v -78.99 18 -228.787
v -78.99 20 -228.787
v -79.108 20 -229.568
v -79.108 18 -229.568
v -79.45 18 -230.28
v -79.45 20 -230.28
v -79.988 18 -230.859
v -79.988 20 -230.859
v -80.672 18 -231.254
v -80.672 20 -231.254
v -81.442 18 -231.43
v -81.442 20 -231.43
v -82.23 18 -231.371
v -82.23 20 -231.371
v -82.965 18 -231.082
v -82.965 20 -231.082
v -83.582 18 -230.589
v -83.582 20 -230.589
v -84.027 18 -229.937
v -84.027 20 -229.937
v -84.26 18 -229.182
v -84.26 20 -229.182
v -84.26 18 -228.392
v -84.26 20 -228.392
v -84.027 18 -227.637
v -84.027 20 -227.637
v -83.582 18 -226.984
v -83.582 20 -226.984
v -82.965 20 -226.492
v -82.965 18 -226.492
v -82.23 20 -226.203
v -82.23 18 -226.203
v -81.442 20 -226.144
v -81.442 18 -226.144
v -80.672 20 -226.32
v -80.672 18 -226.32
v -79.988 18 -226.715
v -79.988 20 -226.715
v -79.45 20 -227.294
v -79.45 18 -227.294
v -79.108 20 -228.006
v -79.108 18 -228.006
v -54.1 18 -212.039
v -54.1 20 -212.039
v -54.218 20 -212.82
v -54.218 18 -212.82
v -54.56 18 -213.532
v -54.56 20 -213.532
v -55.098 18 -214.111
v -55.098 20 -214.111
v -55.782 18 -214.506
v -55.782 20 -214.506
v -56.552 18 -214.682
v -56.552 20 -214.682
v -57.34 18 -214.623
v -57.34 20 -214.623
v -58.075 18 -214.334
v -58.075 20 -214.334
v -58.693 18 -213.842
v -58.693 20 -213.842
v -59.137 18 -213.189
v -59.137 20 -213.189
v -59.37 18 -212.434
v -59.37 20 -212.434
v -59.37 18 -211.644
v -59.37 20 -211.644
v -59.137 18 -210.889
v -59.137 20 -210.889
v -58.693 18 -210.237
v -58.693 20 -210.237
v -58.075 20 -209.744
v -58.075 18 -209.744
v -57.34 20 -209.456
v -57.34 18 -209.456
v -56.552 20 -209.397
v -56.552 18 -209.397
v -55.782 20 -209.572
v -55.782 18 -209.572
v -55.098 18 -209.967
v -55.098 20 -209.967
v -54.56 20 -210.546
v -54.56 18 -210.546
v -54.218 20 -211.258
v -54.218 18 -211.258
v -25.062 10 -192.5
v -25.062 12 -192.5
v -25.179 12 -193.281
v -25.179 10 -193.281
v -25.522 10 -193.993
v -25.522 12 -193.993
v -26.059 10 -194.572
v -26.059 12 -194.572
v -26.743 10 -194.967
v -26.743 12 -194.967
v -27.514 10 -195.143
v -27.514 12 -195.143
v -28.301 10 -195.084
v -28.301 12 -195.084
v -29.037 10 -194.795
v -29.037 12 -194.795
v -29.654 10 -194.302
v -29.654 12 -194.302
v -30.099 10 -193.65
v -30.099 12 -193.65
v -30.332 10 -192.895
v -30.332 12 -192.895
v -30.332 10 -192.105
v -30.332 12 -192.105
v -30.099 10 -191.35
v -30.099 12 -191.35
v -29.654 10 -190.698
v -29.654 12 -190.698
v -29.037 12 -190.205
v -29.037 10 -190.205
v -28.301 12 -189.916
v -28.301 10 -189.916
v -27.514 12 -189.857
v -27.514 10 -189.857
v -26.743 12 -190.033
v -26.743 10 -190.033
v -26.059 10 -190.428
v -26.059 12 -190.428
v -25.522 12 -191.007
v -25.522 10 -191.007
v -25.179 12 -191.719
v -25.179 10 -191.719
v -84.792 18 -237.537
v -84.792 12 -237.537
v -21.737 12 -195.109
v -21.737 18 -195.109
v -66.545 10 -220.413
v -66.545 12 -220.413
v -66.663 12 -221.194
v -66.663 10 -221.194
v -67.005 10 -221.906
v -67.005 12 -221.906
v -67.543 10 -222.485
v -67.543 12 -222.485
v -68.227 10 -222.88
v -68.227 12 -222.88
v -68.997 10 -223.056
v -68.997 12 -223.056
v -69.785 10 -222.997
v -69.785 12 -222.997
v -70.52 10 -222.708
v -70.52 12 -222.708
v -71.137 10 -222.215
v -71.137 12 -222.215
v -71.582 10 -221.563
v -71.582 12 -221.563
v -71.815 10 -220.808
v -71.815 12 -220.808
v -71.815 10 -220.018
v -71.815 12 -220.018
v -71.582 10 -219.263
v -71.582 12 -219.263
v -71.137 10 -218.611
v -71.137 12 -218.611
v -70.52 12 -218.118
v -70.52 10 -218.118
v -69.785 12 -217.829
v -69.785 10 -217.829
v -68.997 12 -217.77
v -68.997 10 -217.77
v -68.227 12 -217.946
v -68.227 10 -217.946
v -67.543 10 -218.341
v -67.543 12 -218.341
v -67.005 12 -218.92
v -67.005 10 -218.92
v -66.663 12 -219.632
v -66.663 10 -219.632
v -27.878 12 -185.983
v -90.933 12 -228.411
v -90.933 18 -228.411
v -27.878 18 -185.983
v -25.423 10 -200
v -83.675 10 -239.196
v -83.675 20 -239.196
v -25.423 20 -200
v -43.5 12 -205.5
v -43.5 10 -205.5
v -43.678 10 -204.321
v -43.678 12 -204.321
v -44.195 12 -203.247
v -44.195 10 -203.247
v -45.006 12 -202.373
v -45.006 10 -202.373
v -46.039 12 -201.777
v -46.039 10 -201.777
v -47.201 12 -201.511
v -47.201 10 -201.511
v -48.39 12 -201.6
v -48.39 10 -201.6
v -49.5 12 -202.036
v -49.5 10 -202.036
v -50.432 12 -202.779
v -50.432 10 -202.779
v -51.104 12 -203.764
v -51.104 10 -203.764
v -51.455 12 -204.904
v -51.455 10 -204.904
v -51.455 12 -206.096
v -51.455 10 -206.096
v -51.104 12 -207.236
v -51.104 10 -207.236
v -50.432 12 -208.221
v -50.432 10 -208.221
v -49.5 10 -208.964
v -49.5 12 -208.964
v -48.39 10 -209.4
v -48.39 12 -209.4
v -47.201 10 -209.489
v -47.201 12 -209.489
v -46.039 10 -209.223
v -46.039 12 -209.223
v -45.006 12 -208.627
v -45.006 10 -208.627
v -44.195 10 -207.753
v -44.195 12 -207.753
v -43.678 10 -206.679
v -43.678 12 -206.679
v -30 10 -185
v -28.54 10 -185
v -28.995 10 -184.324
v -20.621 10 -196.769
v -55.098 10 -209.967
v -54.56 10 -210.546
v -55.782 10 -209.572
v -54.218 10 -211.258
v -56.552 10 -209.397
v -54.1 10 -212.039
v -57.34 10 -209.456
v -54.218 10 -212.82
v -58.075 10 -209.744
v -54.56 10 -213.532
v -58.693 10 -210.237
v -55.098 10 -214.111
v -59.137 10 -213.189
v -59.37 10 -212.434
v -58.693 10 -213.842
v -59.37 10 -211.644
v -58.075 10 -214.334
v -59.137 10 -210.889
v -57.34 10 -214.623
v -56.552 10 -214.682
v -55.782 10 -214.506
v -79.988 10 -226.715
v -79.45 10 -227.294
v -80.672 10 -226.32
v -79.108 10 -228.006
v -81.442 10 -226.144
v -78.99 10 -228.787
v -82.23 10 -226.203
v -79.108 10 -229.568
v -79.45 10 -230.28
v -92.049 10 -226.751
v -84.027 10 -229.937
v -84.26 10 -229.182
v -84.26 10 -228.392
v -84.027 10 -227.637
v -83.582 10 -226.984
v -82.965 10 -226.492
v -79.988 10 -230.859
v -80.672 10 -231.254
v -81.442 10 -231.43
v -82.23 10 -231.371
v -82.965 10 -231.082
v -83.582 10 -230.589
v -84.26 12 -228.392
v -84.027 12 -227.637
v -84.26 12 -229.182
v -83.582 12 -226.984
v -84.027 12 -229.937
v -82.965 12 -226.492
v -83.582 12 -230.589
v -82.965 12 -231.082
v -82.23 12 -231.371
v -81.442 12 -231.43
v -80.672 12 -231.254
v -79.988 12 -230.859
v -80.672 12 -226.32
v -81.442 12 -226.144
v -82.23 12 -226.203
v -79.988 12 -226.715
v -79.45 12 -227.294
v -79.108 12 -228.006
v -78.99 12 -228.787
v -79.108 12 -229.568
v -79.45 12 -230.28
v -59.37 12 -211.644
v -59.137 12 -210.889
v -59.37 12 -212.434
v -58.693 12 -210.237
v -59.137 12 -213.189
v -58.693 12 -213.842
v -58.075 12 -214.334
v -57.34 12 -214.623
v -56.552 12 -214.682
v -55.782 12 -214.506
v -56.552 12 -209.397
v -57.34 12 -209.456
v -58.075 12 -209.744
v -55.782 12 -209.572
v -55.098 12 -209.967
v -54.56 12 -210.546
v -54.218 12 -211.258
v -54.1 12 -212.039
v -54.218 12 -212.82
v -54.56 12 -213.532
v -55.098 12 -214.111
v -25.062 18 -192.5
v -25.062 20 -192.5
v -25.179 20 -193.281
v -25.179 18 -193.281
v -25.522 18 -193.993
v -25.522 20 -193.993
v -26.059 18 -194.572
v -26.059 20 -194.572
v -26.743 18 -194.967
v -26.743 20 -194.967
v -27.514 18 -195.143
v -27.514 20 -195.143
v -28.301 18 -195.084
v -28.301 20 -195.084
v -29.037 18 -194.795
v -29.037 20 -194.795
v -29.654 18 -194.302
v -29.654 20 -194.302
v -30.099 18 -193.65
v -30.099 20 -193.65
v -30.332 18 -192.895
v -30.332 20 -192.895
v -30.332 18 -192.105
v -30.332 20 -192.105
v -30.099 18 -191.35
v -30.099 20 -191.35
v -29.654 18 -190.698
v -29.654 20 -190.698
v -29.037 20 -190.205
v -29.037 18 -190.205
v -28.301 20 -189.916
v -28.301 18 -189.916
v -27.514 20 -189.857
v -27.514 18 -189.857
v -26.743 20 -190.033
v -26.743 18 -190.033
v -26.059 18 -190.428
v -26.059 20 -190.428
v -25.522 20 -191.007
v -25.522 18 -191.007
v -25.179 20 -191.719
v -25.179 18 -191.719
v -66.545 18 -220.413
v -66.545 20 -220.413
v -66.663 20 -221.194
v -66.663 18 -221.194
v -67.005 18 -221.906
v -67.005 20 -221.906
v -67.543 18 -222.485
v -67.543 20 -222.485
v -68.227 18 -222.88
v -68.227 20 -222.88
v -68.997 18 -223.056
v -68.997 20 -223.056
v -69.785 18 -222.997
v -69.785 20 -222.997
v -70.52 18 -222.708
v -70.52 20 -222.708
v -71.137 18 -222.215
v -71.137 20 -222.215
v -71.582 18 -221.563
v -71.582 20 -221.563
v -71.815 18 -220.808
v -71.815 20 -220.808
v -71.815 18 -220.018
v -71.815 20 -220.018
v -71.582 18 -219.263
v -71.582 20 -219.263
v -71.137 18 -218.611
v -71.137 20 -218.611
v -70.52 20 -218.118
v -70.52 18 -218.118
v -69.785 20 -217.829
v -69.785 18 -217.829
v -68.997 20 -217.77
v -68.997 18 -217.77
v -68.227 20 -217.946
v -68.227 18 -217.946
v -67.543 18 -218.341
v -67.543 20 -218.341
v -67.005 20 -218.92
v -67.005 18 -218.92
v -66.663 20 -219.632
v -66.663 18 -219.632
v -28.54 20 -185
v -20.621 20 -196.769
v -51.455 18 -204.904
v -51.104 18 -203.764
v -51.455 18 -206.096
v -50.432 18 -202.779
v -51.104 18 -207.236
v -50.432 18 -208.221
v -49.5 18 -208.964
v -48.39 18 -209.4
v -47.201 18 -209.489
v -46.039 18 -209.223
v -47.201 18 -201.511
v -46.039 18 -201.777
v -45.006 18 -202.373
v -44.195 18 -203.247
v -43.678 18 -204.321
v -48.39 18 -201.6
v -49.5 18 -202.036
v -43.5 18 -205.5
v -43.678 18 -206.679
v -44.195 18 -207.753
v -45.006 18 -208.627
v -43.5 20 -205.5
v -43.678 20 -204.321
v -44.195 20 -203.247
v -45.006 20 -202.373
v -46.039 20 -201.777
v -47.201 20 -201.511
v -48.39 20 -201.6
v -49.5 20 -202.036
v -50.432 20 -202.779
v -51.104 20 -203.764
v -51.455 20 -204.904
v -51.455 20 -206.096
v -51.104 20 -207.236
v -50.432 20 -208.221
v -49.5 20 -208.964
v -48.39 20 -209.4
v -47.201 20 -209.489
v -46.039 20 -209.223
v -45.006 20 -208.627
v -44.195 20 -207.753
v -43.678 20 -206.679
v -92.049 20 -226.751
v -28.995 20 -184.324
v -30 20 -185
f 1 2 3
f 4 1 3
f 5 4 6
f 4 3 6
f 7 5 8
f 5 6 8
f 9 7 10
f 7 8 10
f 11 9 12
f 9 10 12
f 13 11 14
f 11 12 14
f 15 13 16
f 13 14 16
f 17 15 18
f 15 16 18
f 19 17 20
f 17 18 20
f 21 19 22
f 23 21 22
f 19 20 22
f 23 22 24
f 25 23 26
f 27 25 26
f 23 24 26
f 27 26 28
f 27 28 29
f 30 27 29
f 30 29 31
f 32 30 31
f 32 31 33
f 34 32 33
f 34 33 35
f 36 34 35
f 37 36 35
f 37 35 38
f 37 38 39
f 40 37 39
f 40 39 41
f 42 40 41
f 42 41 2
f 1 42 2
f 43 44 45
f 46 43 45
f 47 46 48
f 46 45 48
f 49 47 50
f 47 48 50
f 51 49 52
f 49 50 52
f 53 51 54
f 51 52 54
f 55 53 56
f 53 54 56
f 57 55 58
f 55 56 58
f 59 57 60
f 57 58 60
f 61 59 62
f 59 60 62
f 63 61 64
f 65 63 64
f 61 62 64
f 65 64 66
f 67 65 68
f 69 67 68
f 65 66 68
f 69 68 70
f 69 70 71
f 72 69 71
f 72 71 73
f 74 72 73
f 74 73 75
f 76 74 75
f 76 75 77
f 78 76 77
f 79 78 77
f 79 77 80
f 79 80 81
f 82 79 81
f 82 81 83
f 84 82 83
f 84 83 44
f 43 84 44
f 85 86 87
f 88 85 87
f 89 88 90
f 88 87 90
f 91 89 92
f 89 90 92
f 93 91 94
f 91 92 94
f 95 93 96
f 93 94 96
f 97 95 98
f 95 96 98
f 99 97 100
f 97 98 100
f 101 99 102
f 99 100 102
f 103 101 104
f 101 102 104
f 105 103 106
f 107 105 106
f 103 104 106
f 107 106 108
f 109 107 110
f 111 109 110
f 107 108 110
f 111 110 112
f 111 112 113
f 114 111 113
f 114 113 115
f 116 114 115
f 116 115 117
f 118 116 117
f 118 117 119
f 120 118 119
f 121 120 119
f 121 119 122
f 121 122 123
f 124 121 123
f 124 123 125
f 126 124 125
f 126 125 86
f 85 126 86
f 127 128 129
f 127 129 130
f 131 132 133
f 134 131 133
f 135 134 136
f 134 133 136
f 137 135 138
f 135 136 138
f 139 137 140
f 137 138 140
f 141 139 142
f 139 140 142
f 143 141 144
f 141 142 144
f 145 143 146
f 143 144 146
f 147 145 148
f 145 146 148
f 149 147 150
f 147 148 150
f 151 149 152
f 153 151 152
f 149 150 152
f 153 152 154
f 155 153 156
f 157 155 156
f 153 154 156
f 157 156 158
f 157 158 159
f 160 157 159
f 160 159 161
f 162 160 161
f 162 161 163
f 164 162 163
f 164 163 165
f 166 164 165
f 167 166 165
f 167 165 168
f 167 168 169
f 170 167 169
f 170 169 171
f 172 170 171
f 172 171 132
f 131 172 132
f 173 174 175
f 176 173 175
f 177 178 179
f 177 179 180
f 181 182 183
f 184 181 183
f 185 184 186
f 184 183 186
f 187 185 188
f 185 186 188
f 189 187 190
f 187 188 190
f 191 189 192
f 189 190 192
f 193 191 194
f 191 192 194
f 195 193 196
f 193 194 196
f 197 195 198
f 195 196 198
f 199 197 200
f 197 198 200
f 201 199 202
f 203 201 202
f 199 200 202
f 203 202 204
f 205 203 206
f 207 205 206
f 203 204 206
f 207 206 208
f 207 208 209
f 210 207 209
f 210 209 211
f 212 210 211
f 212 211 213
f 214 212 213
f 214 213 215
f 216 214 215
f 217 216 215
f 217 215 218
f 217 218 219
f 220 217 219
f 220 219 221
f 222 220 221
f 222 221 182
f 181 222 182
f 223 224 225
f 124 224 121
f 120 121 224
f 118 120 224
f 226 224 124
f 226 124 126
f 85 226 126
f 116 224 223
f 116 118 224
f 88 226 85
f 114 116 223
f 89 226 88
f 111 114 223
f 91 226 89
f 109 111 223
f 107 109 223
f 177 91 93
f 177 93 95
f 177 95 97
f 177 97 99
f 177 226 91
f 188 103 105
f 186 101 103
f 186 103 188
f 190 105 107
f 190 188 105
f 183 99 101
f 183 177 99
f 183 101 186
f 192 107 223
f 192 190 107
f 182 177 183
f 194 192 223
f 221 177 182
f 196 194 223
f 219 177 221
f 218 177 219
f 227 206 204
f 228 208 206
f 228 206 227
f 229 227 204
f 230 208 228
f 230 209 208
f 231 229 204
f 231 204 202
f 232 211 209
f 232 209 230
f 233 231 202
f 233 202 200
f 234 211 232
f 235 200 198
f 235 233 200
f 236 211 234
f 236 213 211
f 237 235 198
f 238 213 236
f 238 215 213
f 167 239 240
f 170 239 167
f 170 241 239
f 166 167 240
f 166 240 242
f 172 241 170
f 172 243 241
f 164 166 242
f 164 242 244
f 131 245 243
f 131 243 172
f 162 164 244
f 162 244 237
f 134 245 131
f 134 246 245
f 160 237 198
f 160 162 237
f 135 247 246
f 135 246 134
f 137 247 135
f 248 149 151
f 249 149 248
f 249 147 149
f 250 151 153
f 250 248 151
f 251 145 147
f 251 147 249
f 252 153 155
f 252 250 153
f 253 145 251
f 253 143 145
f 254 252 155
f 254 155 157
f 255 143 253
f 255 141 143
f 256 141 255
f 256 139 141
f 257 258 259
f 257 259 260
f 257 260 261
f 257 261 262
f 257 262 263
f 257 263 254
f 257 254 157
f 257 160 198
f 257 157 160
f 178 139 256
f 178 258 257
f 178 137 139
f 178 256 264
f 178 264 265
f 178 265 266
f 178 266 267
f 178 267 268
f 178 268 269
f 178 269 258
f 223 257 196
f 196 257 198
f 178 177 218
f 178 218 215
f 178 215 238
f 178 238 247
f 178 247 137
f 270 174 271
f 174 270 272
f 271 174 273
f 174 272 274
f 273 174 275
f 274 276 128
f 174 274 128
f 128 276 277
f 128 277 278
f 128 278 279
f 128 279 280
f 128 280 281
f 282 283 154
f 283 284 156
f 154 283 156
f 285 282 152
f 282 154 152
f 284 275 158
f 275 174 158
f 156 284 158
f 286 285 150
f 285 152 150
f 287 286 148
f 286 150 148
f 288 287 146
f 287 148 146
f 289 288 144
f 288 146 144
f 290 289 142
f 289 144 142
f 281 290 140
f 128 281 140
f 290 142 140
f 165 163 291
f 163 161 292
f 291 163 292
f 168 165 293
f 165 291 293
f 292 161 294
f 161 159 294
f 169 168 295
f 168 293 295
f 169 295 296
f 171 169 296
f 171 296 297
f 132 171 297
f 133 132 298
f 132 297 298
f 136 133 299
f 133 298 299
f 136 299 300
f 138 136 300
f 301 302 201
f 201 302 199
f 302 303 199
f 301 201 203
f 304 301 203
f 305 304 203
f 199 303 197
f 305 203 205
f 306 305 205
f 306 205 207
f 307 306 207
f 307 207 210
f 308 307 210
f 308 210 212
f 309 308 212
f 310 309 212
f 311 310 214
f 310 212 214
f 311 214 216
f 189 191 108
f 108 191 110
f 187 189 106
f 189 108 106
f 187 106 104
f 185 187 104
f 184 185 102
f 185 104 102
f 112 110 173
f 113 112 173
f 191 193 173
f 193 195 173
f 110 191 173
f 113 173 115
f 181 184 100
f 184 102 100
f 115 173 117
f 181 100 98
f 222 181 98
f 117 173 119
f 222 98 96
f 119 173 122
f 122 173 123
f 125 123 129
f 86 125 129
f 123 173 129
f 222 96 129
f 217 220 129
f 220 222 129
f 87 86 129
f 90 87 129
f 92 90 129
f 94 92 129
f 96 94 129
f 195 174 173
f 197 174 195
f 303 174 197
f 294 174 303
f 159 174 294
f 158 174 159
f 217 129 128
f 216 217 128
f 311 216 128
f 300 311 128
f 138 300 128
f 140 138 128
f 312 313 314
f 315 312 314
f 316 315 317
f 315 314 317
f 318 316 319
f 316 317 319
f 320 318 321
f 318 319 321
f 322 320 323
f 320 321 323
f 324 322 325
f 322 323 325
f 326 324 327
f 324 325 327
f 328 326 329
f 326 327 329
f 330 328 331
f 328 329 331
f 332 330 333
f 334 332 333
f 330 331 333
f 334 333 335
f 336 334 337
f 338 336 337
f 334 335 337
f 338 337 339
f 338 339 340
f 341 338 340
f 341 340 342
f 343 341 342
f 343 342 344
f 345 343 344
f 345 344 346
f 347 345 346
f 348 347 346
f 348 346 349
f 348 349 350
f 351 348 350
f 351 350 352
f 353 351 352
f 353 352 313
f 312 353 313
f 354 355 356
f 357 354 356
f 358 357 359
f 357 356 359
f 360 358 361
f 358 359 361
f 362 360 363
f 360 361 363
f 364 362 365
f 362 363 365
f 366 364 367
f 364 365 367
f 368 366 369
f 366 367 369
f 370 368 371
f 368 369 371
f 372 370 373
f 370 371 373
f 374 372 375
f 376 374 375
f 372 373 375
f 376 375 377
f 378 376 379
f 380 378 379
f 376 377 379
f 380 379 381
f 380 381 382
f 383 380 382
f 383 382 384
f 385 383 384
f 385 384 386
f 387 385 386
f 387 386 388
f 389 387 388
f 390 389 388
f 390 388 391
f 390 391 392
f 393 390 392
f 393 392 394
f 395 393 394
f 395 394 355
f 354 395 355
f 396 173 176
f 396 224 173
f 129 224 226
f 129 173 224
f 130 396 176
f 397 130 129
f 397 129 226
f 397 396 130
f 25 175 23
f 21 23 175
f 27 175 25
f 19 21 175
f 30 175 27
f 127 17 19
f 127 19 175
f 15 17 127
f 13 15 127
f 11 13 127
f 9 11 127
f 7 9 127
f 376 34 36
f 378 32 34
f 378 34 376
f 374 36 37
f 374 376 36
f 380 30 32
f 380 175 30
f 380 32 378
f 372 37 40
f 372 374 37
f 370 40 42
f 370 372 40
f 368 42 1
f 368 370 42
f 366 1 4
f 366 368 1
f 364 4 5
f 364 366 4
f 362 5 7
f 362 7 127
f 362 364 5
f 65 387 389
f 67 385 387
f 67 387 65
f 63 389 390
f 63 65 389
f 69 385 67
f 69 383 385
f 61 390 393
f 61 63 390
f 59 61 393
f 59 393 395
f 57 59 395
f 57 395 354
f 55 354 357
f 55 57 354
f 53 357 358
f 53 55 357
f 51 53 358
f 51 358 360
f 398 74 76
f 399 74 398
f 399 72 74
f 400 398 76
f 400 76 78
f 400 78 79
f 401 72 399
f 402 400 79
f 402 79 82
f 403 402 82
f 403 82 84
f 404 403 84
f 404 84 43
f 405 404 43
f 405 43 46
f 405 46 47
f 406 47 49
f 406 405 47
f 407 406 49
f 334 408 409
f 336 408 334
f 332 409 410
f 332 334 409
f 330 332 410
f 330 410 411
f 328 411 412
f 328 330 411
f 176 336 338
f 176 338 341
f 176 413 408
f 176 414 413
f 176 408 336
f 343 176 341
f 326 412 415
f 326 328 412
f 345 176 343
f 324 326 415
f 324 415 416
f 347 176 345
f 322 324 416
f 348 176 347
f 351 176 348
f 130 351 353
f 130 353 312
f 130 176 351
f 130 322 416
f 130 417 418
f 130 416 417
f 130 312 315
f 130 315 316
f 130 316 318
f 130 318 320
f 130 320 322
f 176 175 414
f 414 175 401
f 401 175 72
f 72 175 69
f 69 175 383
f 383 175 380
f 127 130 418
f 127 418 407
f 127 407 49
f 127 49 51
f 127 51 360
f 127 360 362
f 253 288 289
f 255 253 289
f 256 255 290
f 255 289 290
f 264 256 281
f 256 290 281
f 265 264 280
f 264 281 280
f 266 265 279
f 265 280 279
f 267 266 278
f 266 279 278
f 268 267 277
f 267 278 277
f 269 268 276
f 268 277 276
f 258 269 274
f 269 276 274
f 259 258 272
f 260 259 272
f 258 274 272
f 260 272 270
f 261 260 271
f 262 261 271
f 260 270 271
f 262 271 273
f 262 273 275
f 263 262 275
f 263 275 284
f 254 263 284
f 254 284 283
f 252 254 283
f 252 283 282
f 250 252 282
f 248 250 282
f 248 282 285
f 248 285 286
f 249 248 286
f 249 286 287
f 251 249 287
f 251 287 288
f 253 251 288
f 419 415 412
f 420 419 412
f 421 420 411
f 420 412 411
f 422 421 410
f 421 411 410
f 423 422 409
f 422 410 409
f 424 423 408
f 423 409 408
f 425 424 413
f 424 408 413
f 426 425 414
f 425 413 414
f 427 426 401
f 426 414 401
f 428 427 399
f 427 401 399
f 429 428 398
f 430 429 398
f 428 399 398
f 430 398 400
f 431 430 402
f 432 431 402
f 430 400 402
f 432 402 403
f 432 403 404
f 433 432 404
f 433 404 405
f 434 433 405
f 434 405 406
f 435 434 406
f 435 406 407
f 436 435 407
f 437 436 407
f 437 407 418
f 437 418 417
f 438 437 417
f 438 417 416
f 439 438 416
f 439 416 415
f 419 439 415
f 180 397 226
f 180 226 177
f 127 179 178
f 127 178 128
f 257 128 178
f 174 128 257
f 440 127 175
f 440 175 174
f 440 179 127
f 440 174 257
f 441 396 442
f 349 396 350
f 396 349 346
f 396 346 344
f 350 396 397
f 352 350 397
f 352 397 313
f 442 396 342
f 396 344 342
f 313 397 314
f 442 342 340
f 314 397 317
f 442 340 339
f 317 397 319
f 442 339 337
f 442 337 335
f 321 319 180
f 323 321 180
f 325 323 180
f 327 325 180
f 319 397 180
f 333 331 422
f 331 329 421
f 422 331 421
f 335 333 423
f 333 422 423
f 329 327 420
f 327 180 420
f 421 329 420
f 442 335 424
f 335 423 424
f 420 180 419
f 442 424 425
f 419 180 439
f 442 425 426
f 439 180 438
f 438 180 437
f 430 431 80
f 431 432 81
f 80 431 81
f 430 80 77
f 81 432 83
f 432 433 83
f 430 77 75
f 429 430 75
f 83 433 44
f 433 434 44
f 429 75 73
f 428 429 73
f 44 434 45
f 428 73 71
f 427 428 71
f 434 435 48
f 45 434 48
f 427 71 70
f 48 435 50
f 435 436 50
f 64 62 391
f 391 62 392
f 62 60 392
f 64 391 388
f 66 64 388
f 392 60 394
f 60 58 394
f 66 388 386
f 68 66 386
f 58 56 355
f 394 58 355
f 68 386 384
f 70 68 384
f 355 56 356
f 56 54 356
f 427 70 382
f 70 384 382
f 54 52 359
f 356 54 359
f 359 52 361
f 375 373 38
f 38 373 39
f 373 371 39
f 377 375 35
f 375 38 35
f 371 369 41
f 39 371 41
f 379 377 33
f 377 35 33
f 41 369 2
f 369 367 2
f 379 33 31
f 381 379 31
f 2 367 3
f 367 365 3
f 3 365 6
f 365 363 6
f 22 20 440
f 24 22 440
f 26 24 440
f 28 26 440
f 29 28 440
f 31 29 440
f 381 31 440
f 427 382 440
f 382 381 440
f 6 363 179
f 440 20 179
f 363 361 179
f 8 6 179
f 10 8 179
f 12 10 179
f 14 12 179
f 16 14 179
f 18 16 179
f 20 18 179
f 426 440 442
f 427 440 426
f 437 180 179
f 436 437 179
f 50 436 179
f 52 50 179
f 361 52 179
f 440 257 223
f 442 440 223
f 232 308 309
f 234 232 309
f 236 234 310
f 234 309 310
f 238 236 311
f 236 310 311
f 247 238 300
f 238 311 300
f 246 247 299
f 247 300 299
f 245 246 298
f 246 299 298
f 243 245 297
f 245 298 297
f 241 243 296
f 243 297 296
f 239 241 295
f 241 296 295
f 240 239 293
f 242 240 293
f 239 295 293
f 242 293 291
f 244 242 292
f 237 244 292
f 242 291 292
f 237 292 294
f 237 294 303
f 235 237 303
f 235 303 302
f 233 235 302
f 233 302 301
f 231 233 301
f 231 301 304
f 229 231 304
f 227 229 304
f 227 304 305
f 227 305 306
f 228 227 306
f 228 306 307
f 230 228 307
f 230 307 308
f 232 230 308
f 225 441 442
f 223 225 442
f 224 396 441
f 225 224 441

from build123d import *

# Parameters (mm, degrees)
SKETCH_1_R               = 275
SKETCH_1_R_2             = 255
EXTRUDE_1_DEPTH          = 10
EXTRUDE_2_DEPTH          = 10
SKETCH_8_R               = 2.65
SKETCH_8_R_2             = 1.65
SKETCH_8_R_3             = 2.15
CUT_EXTRUDE_1_DEPTH      = 21
SKETCH_9_OUTSIDE_W       = 707.614
SKETCH_9_OUTSIDE_H       = 707.614
CUT_EXTRUDE_2_DEPTH      = 21
EXTRUDE_3_DEPTH          = 10
SKETCH_11_W              = 11
SKETCH_11_H              = 6
CUT_EXTRUDE_3_DEPTH      = 509.636319812
CUT_EXTRUDE_3_DEPTH_BACK = 255.723154156
SKETCH_12_W              = 684.820669576
SKETCH_12_H              = 20
CUT_EXTRUDE_4_DEPTH      = 230.939436413
CUT_EXTRUDE_4_DEPTH_BACK = 534.420037555
SKETCH_14_R              = 4
CUT_EXTRUDE_6_DEPTH      = 11


with BuildPart() as part:
    # 草图1 → 凸台-拉伸1 (new body)
    with BuildSketch(Plane(origin=(0, 0, 0), x_dir=(1, 0, 0), z_dir=(0, 1, 0))):
        Circle(SKETCH_1_R)
        Circle(SKETCH_1_R_2, mode=Mode.SUBTRACT)
    extrude(amount=EXTRUDE_1_DEPTH)

    # 草图12 → 切除-拉伸4 (cut, two sides)
    with BuildSketch(Plane(origin=(84.710658728, 0, -125.893697679), x_dir=(-0.829665535, 0, -0.558260781), z_dir=(0.558260781, 0, -0.829665535))) as cut_extrude_4_sk:
        Rectangle(SKETCH_12_W, SKETCH_12_H)
    extrude(amount=CUT_EXTRUDE_4_DEPTH, mode=Mode.SUBTRACT)
    extrude(cut_extrude_4_sk.sketch, amount=-CUT_EXTRUDE_4_DEPTH_BACK, mode=Mode.SUBTRACT)


with BuildPart() as body_2:
    # 草图2 → 凸台-拉伸2 (new body)
    with BuildSketch(Plane(origin=(0, 10, 0), x_dir=(1, 0, 0), z_dir=(0, 1, 0))):
        with BuildLine():
            Line((-110.525139894, 257.262887824), (-25.423255477, 200))
            Line((-25.423255477, 200), (0, 200))
            Line((0, 200), (25.423255477, 200))
            Line((25.423255477, 200), (110.525139894, 257.262887824))
            ThreePointArc((110.525139894, 257.262887824), (197.989898732, 197.989898732), (257.262887824, 110.525139894))
            Line((257.262887824, 110.525139894), (200, 25.423255477))
            Line((200, 25.423255477), (200, 0))
            Line((200, 0), (200, -25.423255477))
            Line((200, -25.423255477), (257.262887824, -110.525139894))
            ThreePointArc((257.262887824, -110.525139894), (197.989898732, -197.989898732), (110.525139894, -257.262887824))
            Line((110.525139894, -257.262887824), (25.423255477, -200))
            Line((25.423255477, -200), (0, -200))
            Line((0, -200), (-25.423255477, -200))
            Line((-25.423255477, -200), (-110.525139894, -257.262887824))
            ThreePointArc((-110.525139894, -257.262887824), (-197.989898732, -197.989898732), (-257.262887824, -110.525139894))
            Line((-257.262887824, -110.525139894), (-200, -25.423255477))
            Line((-200, -25.423255477), (-200, 25.423255477))
            Line((-200, 25.423255477), (-257.262887824, 110.525139894))
            ThreePointArc((-257.262887824, 110.525139894), (-197.989898732, 197.989898732), (-110.525139894, 257.262887824))
        make_face()
        with BuildLine():
            Line((0, 185), (30, 185))
            Line((30, 185), (111.993839361, 240.171563565))
            ThreePointArc((111.993839361, 240.171563565), (187.383297014, 187.383297014), (240.171563565, 111.993839361))
            Line((240.171563565, 111.993839361), (185, 30))
            Line((185, 30), (185, 0))
            Line((185, 0), (185, -30))
            Line((185, -30), (240.171563565, -111.993839361))
            ThreePointArc((240.171563565, -111.993839361), (187.383297014, -187.383297014), (111.993839361, -240.171563565))
            Line((111.993839361, -240.171563565), (30, -185))
            Line((30, -185), (0, -185))
            Line((0, -185), (-30, -185))
            Line((-30, -185), (-111.993839361, -240.171563565))
            ThreePointArc((-111.993839361, -240.171563565), (-187.383297014, -187.383297014), (-240.171563565, -111.993839361))
            Line((-240.171563565, -111.993839361), (-185, -30))
            Line((-185, -30), (-185, 30))
            Line((-185, 30), (-240.171563565, 111.993839361))
            ThreePointArc((-240.171563565, 111.993839361), (-187.383297014, 187.383297014), (-111.993839361, 240.171563565))
            Line((-111.993839361, 240.171563565), (-30, 185))
            Line((-30, 185), (0, 185))
        make_face(mode=Mode.SUBTRACT)
    extrude(amount=EXTRUDE_2_DEPTH)

    # 草图8 → 切除-拉伸1 (cut, through all)
    with BuildSketch(Plane(origin=(0, 20, 0), x_dir=(1, 0, 0), z_dir=(0, 1, 0))):
        with Locations((-10, 192.5)):
            Circle(SKETCH_8_R)
        with Locations((10, 192.5)):
            Circle(SKETCH_8_R)
        with Locations((-10, -192.5)):
            Circle(SKETCH_8_R)
        with Locations((10, -192.5)):
            Circle(SKETCH_8_R)
        with Locations((192.5, 10)):
            Circle(SKETCH_8_R)
        with Locations((192.5, -10)):
            Circle(SKETCH_8_R)
        with Locations((-192.5, 10)):
            Circle(SKETCH_8_R)
        with Locations((-192.5, -10)):
            Circle(SKETCH_8_R)
        with Locations((-110.525139894, 248.223100485)):
            Circle(SKETCH_8_R_2)
        with Locations((-27.711627738, 192.5)):
            Circle(SKETCH_8_R)
        with Locations((-56.749921469, 212.03912734)):
            Circle(SKETCH_8_R)
        with Locations((-69.194904497, 220.413039057)):
            Circle(SKETCH_8_R)
        with Locations((-81.639887524, 228.786950774)):
            Circle(SKETCH_8_R)
        with Locations((-143.808163456, 231.45377032)):
            Circle(SKETCH_8_R_3)
        with Locations((-164.415519771, 217.299729706)):
            Circle(SKETCH_8_R_3)
        with Locations((-183.638937552, 201.316607082)):
            Circle(SKETCH_8_R_3)
        with Locations((-201.316607082, 183.638937552)):
            Circle(SKETCH_8_R_3)
        with Locations((-217.299729706, 164.415519771)):
            Circle(SKETCH_8_R_3)
        with Locations((-231.45377032, 143.808163456)):
            Circle(SKETCH_8_R_3)
        with Locations((-128.811575358, 240.123330241)):
            Circle(SKETCH_8_R)
        with Locations((-240.123330241, 128.811575358)):
            Circle(SKETCH_8_R)
        with Locations((-228.786950774, 81.639887524)):
            Circle(SKETCH_8_R)
        with Locations((-220.413039057, 69.194904497)):
            Circle(SKETCH_8_R)
        with Locations((-212.03912734, 56.749921469)):
            Circle(SKETCH_8_R)
        with Locations((-203.665215623, 44.304938442)):
            Circle(SKETCH_8_R)
        with Locations((-192.5, 27.711627738)):
            Circle(SKETCH_8_R)
        with Locations((-248.223100485, 110.525139894)):
            Circle(SKETCH_8_R_2)
        with Locations((192.5, 27.711627738)):
            Circle(SKETCH_8_R)
        with Locations((248.223100485, 110.525139894)):
            Circle(SKETCH_8_R_2)
        with Locations((203.665215623, 44.304938442)):
            Circle(SKETCH_8_R)
        with Locations((212.03912734, 56.749921469)):
            Circle(SKETCH_8_R)
        with Locations((220.413039057, 69.194904497)):
            Circle(SKETCH_8_R)
        with Locations((228.786950774, 81.639887524)):
            Circle(SKETCH_8_R)
        with Locations((240.123330241, 128.811575358)):
            Circle(SKETCH_8_R)
        with Locations((231.45377032, 143.808163456)):
            Circle(SKETCH_8_R_3)
        with Locations((128.811575358, 240.123330241)):
            Circle(SKETCH_8_R)
        with Locations((201.316607082, 183.638937552)):
            Circle(SKETCH_8_R_3)
        with Locations((183.638937552, 201.316607082)):
            Circle(SKETCH_8_R_3)
        with Locations((164.415519771, 217.299729706)):
            Circle(SKETCH_8_R_3)
        with Locations((143.808163456, 231.45377032)):
            Circle(SKETCH_8_R_3)
        with Locations((81.639887524, 228.786950774)):
            Circle(SKETCH_8_R)
        with Locations((69.194904497, 220.413039057)):
            Circle(SKETCH_8_R)
        with Locations((56.749921469, 212.03912734)):
            Circle(SKETCH_8_R)
        with Locations((110.525139894, 248.223100485)):
            Circle(SKETCH_8_R_2)
        with Locations((27.711627738, 192.5)):
            Circle(SKETCH_8_R)
        with Locations((217.299729706, 164.415519771)):
            Circle(SKETCH_8_R_3)
    extrude(amount=-CUT_EXTRUDE_1_DEPTH, mode=Mode.SUBTRACT)

    # 草图9 outside → 切除-拉伸2 (cut, through all)
    with BuildSketch(Plane(origin=(0, 20, 0), x_dir=(1, 0, 0), z_dir=(0, 1, 0))):
        Rectangle(SKETCH_9_OUTSIDE_W, SKETCH_9_OUTSIDE_H)
        Polygon((-28.994754224, 184.323595752), (-20.620842507, 196.76857878), (-83.675423179, 239.196398147), (-92.049334896, 226.751415119), align=None, mode=Mode.SUBTRACT)
    extrude(amount=-CUT_EXTRUDE_2_DEPTH, mode=Mode.SUBTRACT)

    # 草图10 → 凸台-拉伸3 (add)
    with BuildSketch(Plane(origin=(0, 20, 0), x_dir=(1, 0, 0), z_dir=(0, 1, 0))):
        Polygon((-28.539619055, 185), (-28.994754224, 184.323595752), (-30, 185), align=None)
    extrude(amount=-EXTRUDE_3_DEPTH)

    # 草图11 → 切除-拉伸3 (cut, two sides)
    with BuildSketch(Plane(origin=(-105.331501234, 0, -70.874881101), x_dir=(0.558260781, 0, -0.829665535), z_dir=(0.829665535, 0, 0.558260781))) as cut_extrude_3_sk:
        with Locations((144.240300571, 15)):
            Rectangle(SKETCH_11_W, SKETCH_11_H)
    extrude(amount=CUT_EXTRUDE_3_DEPTH, mode=Mode.SUBTRACT)
    extrude(cut_extrude_3_sk.sketch, amount=-CUT_EXTRUDE_3_DEPTH_BACK, mode=Mode.SUBTRACT)

    # 草图14 → 切除-拉伸6 (cut, through all)
    with BuildSketch(Plane.XZ.offset(-10)):
        with Locations((-47.5, -205.5)):
            Circle(SKETCH_14_R)
    extrude(amount=-CUT_EXTRUDE_6_DEPTH, mode=Mode.SUBTRACT)


solid = body_2.part
